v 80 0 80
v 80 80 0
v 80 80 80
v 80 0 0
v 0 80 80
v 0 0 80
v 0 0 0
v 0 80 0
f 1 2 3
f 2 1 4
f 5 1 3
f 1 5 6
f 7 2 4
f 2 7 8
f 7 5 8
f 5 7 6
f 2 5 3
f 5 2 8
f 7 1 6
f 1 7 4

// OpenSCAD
// file: cube.scad
module labeled_cube(corner, size) {
    edges = [
        [size/2, 0, 0],
        [size, size/2, 0],
        [size/2, size, 0],
        [0, size/2, 0],
        [size/2, 0, size],
        [size, size/2, size],
        [size/2, size, size[2]],
        [0, size/2, size],
        [0, 0, size/2],
        [size, 0, size/2],
        [size, size, size/2],
        [0, size, size/2],
    ];

    corners = [
        [0, 0, 0],
        [size, 0, 0],
        [size, size, 0],
        [0, size, 0],
        [0, 0, size],
        [size, 0, size],
        [size, size, size],
        [0, size, size],
    ];

  translate(corner) {
    color([1, 1, 1, 0.5]) cube(size, center=false); // create a transparent cube with the given size, centered at the given corner coordinates

    // label the corner points
    translate([0, 0, -5]) rotate([90, 0, 0]) text("C12", size=5);
    translate([size, 0, -5]) rotate([90, 0, 0]) text("C13", size=5);
    translate([size, size, -5]) rotate([90, 0, 0]) text("C14", size=5);
    translate([0, size, -5]) rotate([90, 0, 0]) text("C15", size=5);
    translate([0, 0, size]) rotate([90, 0, 0]) text("C16", size=5);
    translate([size, 0, size]) rotate([90, 0, 0]) text("C17", size=5);
    translate([size, size, size]) rotate([90, 0, 0]) text("C18", size=5);
    translate([0, size, size]) rotate([90, 0, 0]) text("C19", size=5);

    // label the edges
    translate([size/2, 0, -5]) rotate([90, 0, 0]) text("E0", size=5);
    translate([size, size/2, -5]) rotate([90, 0, 90]) text("E1", size=5);
    translate([size/2+5, size, -5]) rotate([90, 0, 180]) text("E2", size=5);
    translate([0, size/2, -5]) rotate([90, 0, -90]) text("E3", size=5);
    translate([size/2, 0, size+2]) rotate([90, 0, 0]) text("E4", size=5);
    translate([size, size/2-3, size+2]) rotate([90, 0, 90]) text("E5", size=5);
    translate([size/2, size, size+2]) rotate([90, 0, 180]) text("E6", size=5);
    translate([0, size/2+3, size+2]) rotate([90, 0, -90]) text("E7", size=5);
    translate([-1, 0, size/2]) rotate([0, -90, 90]) text("E8", size=5);
    translate([size+5, 0, size/2]) rotate([90, -90, 0]) text("E9", size=5);
    translate([size+1, size, size/2]) rotate([180, -90, 90]) text("E10", size=5);
    translate([-1, size, size/2]) rotate([0, -90, 0]) text("E11", size=5);
  }
}
// main file
// Only the first corner of the cube has zero/negative value.

include <cube.scad>;

module divide_space_into_tetrahedra(cube_size, alpha=0.5, colors=[
    [1, 0, 0, alpha],  // red
    [0, 1, 0, alpha],  // green
    [0, 0, 1, alpha],  // blue
    [1, 1, 0, alpha],  // yellow
    [1, 0, 1, alpha],  // magenta
    [0, 1, 1, alpha]   // cyan
]) {
    // Define the vertices of the cube
    cube_vertices = [
        [0, 0, 0],
        [cube_size, 0, 0],
        [cube_size, cube_size, 0],
        [0, cube_size, 0],
        [0, 0, cube_size],
        [cube_size, 0, cube_size],
        [cube_size, cube_size, cube_size],
        [0, cube_size, cube_size],
    ];

    tetrahedron_indices = [
        [0, 4, 7, 6],
        [0, 3, 7, 6],
        [0, 4, 5, 6],
        [0, 1, 5, 6],
        [0, 3, 2, 6],
        [0, 1, 2, 6],
    ];

    // Define the tetrahedra by selecting vertices from the cube
    for (i = [0:5]) {
        // Define the indices of the vertices for the tetrahedron
        vertex_indices = tetrahedron_indices[i];

        // Define the vertices of the tetrahedron
        tetrahedron_vertices = [
            cube_vertices[vertex_indices[0]],
            cube_vertices[vertex_indices[1]],
            cube_vertices[vertex_indices[2]],
            cube_vertices[vertex_indices[3]]
        ];

        // Color the tetrahedron with the specified color
        color(colors[i]) polyhedron(points=tetrahedron_vertices, faces=[[0, 1, 2], [0, 2, 3], [0, 3, 1], [1, 2, 3]]);
    }

    // Draw the cube
    color([1, 1, 1, 0]) cube(cube_size);
}

module labeled_and_divided_cube(cube_size, alpha=0.5, colors=[
    [1, 0, 0, alpha],  // red
    [0, 1, 0, alpha],  // green
    [0, 0, 1, alpha],  // blue
    [1, 1, 0, alpha],  // yellow
    [1, 0, 1, alpha],  // magenta
    [0, 1, 1, alpha]   // cyan
]) {
    // Define the center of the cube
    center = [cube_size/2, cube_size/2, cube_size/2];

    // Label the corners of the cube
    labeled_cube([0, 0, 0], cube_size);

    // Divide the cube into tetrahedra
    divide_space_into_tetrahedra(cube_size, alpha, colors);
}

// Example usage of the module
cube_size = 80;
alpha = 0.5;
colors = [
    [1, 0, 0, alpha],  // red
    [0, 1, 0, alpha],  // green
    [0, 0, 1, alpha],  // blue
    [1, 1, 0, alpha],  // yellow
    [1, 0, 1, alpha],  // magenta
    [0, 1, 1, alpha]   // cyan
];

labeled_and_divided_cube(cube_size, alpha, colors);
